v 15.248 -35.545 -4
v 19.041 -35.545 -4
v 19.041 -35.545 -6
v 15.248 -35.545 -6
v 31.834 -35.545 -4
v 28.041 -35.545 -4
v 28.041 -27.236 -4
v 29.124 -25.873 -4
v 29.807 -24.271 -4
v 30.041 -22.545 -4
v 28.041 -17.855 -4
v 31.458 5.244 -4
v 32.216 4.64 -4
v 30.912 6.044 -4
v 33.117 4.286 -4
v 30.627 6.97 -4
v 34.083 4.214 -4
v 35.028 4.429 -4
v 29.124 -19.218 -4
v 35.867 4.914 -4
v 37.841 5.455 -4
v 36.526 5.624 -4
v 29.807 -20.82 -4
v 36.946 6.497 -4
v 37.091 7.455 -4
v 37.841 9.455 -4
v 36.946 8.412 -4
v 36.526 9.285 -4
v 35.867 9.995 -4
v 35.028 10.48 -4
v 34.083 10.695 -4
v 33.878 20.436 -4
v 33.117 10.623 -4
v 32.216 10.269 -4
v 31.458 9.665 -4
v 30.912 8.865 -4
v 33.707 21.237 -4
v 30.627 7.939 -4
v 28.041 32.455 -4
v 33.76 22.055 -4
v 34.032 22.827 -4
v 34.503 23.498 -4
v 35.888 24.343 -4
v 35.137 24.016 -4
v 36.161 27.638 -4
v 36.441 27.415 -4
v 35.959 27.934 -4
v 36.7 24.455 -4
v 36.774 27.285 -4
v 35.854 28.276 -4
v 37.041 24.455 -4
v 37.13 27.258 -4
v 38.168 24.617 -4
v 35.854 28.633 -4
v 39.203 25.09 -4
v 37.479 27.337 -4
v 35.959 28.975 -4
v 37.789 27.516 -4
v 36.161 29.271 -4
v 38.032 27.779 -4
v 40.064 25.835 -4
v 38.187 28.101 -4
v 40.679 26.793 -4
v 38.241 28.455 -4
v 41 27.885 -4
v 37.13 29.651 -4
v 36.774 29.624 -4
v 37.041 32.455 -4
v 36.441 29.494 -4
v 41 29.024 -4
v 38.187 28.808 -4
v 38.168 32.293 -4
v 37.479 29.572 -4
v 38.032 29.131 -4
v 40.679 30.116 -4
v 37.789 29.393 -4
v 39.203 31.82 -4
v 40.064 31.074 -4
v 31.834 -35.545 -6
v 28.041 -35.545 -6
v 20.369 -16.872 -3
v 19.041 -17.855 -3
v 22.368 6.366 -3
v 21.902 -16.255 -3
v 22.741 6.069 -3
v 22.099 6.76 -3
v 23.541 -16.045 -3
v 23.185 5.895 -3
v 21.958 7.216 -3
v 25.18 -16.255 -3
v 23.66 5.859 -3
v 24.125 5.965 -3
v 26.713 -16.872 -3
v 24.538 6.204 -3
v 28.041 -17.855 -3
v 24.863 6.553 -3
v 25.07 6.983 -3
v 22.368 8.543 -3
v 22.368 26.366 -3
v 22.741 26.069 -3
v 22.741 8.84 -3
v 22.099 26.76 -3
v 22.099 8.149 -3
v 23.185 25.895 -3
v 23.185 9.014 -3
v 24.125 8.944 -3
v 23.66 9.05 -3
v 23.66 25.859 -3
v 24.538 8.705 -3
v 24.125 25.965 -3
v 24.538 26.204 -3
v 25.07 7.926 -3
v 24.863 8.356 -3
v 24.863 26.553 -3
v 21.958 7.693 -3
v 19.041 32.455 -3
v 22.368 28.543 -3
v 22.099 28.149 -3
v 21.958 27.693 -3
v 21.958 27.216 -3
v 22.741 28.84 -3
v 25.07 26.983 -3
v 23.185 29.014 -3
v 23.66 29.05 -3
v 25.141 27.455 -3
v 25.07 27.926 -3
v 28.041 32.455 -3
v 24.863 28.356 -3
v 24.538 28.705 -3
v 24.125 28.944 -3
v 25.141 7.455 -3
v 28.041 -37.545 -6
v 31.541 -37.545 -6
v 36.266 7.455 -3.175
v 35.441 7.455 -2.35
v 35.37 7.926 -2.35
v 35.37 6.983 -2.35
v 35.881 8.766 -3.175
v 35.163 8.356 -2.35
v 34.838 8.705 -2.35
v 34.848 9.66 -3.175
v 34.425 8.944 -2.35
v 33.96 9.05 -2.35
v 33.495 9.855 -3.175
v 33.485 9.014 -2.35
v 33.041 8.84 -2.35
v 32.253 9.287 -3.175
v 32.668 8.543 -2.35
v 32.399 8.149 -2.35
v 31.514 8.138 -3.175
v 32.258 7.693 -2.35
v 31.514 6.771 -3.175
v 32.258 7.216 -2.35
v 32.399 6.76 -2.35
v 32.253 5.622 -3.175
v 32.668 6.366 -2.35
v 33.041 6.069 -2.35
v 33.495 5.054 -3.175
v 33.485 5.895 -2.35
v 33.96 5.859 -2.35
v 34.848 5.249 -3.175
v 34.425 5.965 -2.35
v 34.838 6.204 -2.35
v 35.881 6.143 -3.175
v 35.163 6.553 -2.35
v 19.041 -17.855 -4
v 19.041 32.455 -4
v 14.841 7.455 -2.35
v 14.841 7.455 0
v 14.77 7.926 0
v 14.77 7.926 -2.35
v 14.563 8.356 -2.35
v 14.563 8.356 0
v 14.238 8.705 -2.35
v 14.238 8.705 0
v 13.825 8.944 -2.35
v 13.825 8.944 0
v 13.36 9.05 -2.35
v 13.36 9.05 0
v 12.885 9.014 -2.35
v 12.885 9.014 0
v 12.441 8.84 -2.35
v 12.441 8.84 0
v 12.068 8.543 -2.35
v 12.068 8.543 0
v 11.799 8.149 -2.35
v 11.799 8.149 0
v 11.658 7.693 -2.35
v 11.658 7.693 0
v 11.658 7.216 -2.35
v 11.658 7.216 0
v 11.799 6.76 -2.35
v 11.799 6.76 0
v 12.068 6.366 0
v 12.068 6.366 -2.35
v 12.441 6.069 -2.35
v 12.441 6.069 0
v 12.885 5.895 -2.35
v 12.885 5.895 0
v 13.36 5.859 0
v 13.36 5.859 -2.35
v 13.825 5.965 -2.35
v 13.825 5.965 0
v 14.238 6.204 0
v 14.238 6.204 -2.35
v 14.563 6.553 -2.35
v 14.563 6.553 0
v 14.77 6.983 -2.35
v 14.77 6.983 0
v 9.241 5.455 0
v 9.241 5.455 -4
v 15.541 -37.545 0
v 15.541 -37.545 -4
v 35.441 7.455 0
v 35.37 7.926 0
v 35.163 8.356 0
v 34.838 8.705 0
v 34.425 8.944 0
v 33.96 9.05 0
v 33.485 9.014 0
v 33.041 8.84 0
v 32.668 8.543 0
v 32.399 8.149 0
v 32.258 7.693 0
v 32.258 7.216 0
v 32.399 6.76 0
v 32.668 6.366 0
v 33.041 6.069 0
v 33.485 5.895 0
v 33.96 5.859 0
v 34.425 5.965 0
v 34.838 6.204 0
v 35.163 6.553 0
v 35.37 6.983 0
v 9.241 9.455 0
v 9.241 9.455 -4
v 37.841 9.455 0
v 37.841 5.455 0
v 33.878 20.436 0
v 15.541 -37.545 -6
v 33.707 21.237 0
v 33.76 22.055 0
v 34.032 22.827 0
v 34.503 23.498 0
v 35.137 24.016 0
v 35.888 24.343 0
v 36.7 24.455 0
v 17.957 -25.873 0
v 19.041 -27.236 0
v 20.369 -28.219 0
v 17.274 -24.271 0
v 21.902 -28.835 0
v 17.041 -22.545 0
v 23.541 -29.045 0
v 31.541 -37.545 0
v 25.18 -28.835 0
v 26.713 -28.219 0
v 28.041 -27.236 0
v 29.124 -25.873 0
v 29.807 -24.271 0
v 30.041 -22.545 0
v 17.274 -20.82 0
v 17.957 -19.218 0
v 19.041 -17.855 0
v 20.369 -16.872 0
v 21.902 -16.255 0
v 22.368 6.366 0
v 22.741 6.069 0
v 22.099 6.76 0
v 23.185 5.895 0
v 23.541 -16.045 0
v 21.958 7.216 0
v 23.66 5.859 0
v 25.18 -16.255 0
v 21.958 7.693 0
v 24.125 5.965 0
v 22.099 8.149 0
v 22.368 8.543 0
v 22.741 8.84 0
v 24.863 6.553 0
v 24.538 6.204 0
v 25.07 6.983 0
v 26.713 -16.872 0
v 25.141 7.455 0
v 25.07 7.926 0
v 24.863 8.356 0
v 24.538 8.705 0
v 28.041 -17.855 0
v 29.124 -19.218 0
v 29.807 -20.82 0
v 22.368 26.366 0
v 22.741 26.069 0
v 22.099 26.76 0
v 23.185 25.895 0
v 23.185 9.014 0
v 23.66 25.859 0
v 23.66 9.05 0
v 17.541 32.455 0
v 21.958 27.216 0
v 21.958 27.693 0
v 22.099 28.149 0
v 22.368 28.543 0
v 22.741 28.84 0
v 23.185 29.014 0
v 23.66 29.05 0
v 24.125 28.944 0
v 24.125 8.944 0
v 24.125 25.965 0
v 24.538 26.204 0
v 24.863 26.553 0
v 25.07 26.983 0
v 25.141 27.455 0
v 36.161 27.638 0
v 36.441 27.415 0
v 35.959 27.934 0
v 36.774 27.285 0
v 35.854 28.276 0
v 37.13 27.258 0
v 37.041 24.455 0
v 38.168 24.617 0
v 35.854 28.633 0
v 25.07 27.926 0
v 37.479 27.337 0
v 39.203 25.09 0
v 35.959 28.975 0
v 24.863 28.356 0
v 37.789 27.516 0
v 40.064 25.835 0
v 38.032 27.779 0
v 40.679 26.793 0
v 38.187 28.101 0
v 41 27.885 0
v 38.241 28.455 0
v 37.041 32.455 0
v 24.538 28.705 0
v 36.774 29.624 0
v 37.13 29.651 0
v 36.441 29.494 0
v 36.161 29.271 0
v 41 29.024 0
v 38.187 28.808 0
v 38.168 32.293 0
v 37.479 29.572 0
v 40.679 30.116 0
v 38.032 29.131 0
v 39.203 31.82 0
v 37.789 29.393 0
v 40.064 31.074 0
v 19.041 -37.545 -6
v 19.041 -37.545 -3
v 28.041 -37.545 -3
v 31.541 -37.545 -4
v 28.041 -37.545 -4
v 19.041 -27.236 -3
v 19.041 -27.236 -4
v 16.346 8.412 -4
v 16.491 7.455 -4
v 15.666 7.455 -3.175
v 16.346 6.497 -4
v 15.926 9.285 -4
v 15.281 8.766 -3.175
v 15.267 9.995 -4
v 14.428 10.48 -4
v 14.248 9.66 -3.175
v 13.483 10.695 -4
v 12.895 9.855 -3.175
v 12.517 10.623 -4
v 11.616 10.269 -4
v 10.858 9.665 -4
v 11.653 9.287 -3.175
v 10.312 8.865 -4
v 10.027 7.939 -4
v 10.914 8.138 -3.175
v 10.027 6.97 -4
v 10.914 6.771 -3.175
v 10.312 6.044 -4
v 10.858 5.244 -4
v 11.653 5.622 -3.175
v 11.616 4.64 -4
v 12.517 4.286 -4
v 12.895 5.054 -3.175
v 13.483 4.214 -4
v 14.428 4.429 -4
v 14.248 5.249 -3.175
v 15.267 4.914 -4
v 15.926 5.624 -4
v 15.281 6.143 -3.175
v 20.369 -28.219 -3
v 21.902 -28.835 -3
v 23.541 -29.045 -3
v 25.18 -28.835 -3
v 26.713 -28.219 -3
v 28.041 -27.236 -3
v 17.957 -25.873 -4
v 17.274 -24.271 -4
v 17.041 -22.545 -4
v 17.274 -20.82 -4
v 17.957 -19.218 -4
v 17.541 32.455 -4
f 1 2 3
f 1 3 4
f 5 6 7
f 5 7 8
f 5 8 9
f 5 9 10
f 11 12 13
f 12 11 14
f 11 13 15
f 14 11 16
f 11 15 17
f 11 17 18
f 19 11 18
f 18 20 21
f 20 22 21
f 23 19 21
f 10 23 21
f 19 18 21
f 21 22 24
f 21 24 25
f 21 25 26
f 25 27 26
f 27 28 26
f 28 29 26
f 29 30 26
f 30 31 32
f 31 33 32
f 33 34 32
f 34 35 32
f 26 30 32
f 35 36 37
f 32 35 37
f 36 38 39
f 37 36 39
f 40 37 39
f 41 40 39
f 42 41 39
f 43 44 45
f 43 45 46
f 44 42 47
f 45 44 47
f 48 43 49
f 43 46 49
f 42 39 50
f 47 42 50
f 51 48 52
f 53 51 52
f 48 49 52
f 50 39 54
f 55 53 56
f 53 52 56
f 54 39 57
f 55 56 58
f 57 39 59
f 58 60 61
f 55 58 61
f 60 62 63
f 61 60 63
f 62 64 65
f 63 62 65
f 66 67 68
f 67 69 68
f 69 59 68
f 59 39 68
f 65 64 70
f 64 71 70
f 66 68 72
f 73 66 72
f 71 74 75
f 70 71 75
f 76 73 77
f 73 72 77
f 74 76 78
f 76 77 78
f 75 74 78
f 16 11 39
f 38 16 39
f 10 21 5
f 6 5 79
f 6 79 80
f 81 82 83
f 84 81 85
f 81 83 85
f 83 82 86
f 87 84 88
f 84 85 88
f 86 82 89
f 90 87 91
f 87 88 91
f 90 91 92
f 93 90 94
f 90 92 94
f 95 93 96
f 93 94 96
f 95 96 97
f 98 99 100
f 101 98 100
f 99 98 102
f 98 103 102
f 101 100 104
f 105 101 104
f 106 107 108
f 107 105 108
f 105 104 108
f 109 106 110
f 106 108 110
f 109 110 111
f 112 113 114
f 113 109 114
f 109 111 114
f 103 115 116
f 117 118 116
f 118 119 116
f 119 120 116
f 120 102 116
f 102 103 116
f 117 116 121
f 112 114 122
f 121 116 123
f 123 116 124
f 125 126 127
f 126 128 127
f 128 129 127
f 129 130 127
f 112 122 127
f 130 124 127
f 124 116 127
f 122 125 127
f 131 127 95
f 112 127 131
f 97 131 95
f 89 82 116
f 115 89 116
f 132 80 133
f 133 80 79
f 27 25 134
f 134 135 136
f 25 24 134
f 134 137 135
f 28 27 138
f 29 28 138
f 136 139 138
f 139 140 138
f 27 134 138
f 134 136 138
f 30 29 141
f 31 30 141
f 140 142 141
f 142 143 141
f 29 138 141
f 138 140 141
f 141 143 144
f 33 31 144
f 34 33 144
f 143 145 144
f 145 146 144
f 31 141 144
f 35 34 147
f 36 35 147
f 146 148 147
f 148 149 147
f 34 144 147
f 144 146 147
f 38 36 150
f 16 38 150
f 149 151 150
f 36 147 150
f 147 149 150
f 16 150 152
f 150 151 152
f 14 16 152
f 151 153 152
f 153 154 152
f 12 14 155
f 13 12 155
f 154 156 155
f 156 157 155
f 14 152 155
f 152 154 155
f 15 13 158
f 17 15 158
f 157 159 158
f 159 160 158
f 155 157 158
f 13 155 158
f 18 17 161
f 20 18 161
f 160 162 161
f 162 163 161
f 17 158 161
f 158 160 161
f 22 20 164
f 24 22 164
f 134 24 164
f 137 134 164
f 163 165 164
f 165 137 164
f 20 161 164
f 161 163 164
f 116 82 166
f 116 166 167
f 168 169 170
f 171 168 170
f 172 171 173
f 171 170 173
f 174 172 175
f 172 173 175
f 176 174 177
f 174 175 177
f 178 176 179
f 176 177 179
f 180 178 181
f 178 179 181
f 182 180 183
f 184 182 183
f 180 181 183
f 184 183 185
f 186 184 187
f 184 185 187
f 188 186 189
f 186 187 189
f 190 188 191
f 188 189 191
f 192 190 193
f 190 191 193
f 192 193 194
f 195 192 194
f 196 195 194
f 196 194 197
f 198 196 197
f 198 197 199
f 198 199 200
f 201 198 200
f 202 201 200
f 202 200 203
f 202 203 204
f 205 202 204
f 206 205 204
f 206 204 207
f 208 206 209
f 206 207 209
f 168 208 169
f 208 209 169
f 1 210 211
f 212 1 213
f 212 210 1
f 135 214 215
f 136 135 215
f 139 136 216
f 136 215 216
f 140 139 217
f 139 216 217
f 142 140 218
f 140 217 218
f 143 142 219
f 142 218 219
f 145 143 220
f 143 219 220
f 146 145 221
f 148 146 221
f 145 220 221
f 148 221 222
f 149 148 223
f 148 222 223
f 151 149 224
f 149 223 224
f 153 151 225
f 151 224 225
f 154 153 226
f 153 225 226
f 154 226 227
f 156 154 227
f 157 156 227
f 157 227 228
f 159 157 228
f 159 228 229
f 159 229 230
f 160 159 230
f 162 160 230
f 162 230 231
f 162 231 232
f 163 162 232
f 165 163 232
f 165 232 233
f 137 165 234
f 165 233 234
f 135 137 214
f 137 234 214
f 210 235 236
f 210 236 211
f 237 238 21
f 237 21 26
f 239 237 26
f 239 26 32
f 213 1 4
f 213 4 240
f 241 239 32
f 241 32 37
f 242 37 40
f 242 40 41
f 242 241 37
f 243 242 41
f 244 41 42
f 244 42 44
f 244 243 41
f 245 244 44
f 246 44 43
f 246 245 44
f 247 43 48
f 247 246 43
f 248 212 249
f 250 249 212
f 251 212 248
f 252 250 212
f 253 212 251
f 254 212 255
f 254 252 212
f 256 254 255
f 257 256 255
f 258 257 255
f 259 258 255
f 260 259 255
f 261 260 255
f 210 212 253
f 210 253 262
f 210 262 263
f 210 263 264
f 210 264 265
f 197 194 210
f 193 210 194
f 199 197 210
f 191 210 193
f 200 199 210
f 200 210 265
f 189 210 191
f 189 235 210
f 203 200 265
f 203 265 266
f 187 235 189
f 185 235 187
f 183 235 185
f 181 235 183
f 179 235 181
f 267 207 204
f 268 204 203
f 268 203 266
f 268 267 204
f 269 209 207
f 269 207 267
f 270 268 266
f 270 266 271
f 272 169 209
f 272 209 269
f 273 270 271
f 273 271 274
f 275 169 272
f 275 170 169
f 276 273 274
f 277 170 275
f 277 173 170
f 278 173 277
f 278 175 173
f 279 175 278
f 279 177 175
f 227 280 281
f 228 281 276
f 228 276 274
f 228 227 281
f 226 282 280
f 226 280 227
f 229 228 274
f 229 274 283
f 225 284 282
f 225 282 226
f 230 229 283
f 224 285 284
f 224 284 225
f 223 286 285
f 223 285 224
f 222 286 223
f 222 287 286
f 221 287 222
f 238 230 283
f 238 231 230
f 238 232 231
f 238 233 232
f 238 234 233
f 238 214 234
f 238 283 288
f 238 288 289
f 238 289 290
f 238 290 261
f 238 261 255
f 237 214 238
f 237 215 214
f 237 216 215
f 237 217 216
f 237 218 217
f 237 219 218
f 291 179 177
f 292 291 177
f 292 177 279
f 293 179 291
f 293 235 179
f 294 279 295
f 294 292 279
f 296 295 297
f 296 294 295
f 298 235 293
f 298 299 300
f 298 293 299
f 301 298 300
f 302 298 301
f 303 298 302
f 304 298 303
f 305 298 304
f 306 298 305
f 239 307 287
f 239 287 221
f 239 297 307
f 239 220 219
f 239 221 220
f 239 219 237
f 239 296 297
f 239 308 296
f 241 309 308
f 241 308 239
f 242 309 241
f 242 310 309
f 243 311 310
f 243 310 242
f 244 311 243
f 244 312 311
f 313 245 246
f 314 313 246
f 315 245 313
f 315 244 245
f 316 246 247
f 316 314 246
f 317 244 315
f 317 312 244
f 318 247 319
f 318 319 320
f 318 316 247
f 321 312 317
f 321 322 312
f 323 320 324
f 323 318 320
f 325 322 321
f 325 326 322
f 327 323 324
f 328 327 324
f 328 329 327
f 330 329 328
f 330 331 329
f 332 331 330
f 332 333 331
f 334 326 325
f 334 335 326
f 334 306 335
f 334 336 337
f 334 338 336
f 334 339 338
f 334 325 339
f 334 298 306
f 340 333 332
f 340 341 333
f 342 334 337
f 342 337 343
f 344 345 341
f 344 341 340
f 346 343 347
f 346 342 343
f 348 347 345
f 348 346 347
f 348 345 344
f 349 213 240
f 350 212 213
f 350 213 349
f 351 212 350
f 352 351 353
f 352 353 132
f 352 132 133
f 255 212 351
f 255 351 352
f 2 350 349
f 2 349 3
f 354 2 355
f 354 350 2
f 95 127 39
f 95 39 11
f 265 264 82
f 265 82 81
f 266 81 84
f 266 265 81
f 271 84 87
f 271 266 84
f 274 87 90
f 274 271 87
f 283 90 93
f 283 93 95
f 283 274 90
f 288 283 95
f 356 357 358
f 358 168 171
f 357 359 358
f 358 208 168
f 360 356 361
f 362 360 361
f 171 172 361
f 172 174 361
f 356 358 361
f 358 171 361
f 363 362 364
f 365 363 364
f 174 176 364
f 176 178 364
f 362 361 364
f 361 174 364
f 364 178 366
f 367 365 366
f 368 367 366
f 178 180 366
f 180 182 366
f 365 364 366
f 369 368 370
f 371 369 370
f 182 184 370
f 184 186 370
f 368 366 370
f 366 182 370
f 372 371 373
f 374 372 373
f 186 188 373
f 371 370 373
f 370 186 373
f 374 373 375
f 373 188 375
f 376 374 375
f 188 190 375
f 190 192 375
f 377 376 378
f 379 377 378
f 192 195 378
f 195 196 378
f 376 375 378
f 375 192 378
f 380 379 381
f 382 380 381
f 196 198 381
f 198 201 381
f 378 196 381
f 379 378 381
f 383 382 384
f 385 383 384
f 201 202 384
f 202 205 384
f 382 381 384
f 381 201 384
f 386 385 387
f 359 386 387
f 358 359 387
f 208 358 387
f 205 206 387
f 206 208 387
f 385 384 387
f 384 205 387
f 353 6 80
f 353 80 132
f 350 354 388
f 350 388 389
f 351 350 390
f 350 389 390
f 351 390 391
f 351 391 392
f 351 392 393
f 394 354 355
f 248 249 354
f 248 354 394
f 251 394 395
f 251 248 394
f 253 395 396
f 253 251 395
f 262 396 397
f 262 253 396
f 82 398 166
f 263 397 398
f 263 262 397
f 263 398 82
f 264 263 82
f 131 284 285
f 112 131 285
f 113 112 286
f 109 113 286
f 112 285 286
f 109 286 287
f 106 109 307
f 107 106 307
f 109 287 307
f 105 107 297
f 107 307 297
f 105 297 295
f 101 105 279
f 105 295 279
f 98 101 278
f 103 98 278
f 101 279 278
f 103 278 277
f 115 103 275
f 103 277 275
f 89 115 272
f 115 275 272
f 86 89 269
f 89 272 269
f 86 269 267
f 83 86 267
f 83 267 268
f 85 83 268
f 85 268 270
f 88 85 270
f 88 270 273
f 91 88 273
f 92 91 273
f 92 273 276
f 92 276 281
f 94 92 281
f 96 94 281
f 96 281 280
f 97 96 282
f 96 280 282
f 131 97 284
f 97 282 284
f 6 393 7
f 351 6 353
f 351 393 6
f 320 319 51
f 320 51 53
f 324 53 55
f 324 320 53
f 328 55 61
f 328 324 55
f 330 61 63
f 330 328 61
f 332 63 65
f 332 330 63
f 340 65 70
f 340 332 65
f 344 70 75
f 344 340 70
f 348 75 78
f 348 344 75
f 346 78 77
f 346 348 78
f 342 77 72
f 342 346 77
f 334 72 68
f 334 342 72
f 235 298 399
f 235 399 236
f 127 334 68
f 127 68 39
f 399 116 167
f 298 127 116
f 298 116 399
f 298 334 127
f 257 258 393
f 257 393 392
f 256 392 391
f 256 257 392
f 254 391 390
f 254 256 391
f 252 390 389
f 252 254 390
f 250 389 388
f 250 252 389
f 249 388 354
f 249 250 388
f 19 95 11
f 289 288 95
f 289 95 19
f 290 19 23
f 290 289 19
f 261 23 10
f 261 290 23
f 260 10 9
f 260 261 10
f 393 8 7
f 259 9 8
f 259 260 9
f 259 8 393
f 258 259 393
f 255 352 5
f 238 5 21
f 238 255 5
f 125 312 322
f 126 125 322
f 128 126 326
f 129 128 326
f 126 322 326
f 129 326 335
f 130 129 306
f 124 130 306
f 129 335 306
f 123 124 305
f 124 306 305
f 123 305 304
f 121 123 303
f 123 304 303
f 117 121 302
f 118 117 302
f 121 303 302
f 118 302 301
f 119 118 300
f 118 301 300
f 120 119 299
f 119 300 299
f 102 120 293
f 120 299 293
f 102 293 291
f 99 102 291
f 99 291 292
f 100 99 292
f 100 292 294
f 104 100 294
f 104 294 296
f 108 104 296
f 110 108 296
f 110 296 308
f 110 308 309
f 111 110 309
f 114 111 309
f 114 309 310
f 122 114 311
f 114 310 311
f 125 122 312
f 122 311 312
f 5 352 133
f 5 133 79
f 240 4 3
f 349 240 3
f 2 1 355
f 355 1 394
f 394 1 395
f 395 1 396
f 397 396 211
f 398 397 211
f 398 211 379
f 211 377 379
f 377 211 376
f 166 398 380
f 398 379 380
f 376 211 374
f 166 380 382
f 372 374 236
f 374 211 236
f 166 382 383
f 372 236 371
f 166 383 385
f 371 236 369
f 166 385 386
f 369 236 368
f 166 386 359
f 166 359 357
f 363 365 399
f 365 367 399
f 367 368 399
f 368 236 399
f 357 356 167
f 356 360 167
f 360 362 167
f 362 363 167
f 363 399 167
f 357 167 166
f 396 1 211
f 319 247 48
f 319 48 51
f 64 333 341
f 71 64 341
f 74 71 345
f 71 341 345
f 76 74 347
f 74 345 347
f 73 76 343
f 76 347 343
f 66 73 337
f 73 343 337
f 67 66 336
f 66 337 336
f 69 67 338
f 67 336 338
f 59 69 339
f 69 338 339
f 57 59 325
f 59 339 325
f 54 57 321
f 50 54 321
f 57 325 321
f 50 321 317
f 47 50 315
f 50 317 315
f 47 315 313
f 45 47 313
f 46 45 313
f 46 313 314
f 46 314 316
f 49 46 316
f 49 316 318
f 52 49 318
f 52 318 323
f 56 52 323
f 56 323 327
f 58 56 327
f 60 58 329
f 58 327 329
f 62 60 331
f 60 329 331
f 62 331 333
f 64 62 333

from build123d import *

# Parameters (mm, degrees)
MODEL_R           = 1.2
MODEL_R_2         = 1.6
EXTRUDE_4_DEPTH   = 4
EXTRUDE_4_2_DEPTH = 4
MODEL_7_R         = 1.6
EXTRUDE_5_DEPTH   = 3
EXTRUDE_6_DEPTH   = 6
CHAMFER_2_SIZE    = 1.65


with BuildPart() as part:
    # Model → 凸台-拉伸4 (new body)
    with BuildSketch(Plane.XY):
        with BuildLine():
            Line((36.699535099, 24.454545455), (37.040606061, 24.454545455))
            ThreePointArc((37.040606061, 24.454545455), (41.040606061, 28.454545455), (37.040606061, 32.454545455))
            Line((37.040606061, 32.454545455), (28.040606061, 32.454545455))
            Line((28.040606061, 32.454545455), (28.040606061, -17.855038786))
            ThreePointArc((28.040606061, -17.855038786), (30.040606061, -22.545454545), (28.040606061, -27.235870305))
            Line((28.040606061, -27.235870305), (28.040606061, -37.545454545))
            Line((28.040606061, -37.545454545), (31.540606061, -37.545454545))
            Line((31.540606061, -37.545454545), (37.840606061, 5.454545455))
            Line((37.840606061, 5.454545455), (37.840606061, 9.454545455))
            Line((37.840606061, 9.454545455), (33.877655721, 20.43621507))
            ThreePointArc((33.877655721, 20.43621507), (34.244439261, 23.178640702), (36.699535099, 24.454545455))
        make_face()
        with Locations((37.040606061, 28.454545455)):
            Circle(MODEL_R, mode=Mode.SUBTRACT)
        with Locations((33.840606061, 7.454545455)):
            Circle(MODEL_R_2, mode=Mode.SUBTRACT)
    extrude(amount=-EXTRUDE_4_DEPTH)



with BuildPart() as body_2:
    # Model → Extrude 4 2 (new body)
    with BuildSketch(Plane.XY):
        with BuildLine():
            Line((19.040606061, -17.855038786), (19.040606061, 32.454545455))
            Line((19.040606061, 32.454545455), (17.540606061, 32.454545455))
            Line((17.540606061, 32.454545455), (9.240606061, 9.454545455))
            Line((9.240606061, 9.454545455), (9.240606061, 5.454545455))
            Line((9.240606061, 5.454545455), (15.540606061, -37.545454545))
            Line((15.540606061, -37.545454545), (19.040606061, -37.545454545))
            Line((19.040606061, -37.545454545), (19.040606061, -27.235870305))
            ThreePointArc((19.040606061, -27.235870305), (17.040606061, -22.545454545), (19.040606061, -17.855038786))
        make_face()
        with Locations((13.240606061, 7.454545455)):
            Circle(MODEL_R_2, mode=Mode.SUBTRACT)
    extrude(amount=-EXTRUDE_4_2_DEPTH)


with BuildPart() as part_1:
    add(part.part)

    add(body_2.part)  # 凸台-拉伸5 merges body 2
    # Model<7> → 凸台-拉伸5 (add)
    # profile 1 of 2: a face of its own
    with BuildSketch(Plane.XY):
        with BuildLine():
            Line((28.040606061, -17.855038786), (28.040606061, 32.454545455))
            Line((28.040606061, 32.454545455), (19.040606061, 32.454545455))
            Line((19.040606061, 32.454545455), (19.040606061, -17.855038786))
            ThreePointArc((19.040606061, -17.855038786), (23.540606061, -16.045454545), (28.040606061, -17.855038786))
        make_face()
        with Locations((23.540606061, 7.454545455)):
            Circle(MODEL_7_R, mode=Mode.SUBTRACT)
        with Locations((23.540606061, 27.454545455)):
            Circle(MODEL_7_R, mode=Mode.SUBTRACT)
    # profile 2 of 2: a face of its own
    with BuildSketch(Plane.XY):
        with BuildLine():
            Line((28.040606061, -37.545454545), (28.040606061, -27.235870305))
            ThreePointArc((28.040606061, -27.235870305), (23.540606061, -29.045454545), (19.040606061, -27.235870305))
            Line((19.040606061, -27.235870305), (19.040606061, -37.545454545))
            Line((19.040606061, -37.545454545), (28.040606061, -37.545454545))
        make_face()
    extrude(amount=-EXTRUDE_5_DEPTH)

    # Model<8> → 凸台-拉伸6 (add)
    with BuildSketch(Plane.XY):
        Polygon((31.540606061, -37.545454545), (31.833629316, -35.545454545), (28.04060606, -35.545454545), (28.040606061, -37.545454545), align=None)
        Polygon((19.040606061, -37.545454545), (19.040606061, -35.545454545), (15.247582805, -35.545454545), (15.540606061, -37.545454545), align=None)
    extrude(amount=-EXTRUDE_6_DEPTH)

    # 倒角2
    chamfer_2_edges = [part_1.edges().sort_by_distance(p)[0] for p in [
        (11.640606061, 7.454545455, -4),
        (32.240606061, 7.454545455, -4),
    ]]
    chamfer(chamfer_2_edges, length=CHAMFER_2_SIZE)


solid = part_1.part
